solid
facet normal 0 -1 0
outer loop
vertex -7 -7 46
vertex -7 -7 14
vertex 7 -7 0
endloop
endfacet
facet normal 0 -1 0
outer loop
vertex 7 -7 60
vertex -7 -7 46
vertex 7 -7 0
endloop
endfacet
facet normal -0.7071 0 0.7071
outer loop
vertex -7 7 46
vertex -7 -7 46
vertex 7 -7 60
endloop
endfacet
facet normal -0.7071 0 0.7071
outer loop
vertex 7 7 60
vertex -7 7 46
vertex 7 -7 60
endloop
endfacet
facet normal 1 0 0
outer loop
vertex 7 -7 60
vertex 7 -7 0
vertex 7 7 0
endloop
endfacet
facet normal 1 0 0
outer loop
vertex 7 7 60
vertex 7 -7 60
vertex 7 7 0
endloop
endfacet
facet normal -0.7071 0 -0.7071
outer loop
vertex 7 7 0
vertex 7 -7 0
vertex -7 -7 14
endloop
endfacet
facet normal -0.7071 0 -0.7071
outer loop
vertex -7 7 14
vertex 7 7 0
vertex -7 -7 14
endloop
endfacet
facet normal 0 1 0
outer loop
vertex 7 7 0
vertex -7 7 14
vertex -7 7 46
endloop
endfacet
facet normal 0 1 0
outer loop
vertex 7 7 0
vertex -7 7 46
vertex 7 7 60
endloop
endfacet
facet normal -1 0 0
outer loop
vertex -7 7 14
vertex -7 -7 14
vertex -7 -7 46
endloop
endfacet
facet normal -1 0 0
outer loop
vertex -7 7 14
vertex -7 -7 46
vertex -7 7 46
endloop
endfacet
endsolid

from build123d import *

# Parameters (mm, degrees)
F0_W     = 14
F0_H     = 14
F1_DEPTH = 60
F3_DEPTH = 25
F5_DEPTH = 25


with BuildPart() as f1:
    # F0 (on Top) → F1 (new body)
    with BuildSketch(Plane.XY):
        Rectangle(F0_W, F0_H)
    extrude(amount=F1_DEPTH)

    # F2 (on face) → F3 (cut)
    with BuildSketch(Plane.XZ.offset(7)):
        Polygon((-7, 46), (7, 60), (-7, 60), align=None)
    extrude(amount=-F3_DEPTH, mode=Mode.SUBTRACT)

    # F4 (on face) → F5 (cut)
    with BuildSketch(Plane.XZ.offset(7)):
        Polygon((-7, 0), (7, 0), (-7, 14), align=None)
    extrude(amount=-F5_DEPTH, mode=Mode.SUBTRACT)


solid = f1.part
